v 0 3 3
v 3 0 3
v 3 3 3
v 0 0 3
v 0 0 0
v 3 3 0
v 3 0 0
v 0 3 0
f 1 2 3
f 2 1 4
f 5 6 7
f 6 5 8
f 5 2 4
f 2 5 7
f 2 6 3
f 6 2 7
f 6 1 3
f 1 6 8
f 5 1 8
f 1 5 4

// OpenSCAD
let (a = 1, b = a + 1) echo("let module", a, b);
let (c = 3) {
  echo("block", c);
  cube(c);
}
